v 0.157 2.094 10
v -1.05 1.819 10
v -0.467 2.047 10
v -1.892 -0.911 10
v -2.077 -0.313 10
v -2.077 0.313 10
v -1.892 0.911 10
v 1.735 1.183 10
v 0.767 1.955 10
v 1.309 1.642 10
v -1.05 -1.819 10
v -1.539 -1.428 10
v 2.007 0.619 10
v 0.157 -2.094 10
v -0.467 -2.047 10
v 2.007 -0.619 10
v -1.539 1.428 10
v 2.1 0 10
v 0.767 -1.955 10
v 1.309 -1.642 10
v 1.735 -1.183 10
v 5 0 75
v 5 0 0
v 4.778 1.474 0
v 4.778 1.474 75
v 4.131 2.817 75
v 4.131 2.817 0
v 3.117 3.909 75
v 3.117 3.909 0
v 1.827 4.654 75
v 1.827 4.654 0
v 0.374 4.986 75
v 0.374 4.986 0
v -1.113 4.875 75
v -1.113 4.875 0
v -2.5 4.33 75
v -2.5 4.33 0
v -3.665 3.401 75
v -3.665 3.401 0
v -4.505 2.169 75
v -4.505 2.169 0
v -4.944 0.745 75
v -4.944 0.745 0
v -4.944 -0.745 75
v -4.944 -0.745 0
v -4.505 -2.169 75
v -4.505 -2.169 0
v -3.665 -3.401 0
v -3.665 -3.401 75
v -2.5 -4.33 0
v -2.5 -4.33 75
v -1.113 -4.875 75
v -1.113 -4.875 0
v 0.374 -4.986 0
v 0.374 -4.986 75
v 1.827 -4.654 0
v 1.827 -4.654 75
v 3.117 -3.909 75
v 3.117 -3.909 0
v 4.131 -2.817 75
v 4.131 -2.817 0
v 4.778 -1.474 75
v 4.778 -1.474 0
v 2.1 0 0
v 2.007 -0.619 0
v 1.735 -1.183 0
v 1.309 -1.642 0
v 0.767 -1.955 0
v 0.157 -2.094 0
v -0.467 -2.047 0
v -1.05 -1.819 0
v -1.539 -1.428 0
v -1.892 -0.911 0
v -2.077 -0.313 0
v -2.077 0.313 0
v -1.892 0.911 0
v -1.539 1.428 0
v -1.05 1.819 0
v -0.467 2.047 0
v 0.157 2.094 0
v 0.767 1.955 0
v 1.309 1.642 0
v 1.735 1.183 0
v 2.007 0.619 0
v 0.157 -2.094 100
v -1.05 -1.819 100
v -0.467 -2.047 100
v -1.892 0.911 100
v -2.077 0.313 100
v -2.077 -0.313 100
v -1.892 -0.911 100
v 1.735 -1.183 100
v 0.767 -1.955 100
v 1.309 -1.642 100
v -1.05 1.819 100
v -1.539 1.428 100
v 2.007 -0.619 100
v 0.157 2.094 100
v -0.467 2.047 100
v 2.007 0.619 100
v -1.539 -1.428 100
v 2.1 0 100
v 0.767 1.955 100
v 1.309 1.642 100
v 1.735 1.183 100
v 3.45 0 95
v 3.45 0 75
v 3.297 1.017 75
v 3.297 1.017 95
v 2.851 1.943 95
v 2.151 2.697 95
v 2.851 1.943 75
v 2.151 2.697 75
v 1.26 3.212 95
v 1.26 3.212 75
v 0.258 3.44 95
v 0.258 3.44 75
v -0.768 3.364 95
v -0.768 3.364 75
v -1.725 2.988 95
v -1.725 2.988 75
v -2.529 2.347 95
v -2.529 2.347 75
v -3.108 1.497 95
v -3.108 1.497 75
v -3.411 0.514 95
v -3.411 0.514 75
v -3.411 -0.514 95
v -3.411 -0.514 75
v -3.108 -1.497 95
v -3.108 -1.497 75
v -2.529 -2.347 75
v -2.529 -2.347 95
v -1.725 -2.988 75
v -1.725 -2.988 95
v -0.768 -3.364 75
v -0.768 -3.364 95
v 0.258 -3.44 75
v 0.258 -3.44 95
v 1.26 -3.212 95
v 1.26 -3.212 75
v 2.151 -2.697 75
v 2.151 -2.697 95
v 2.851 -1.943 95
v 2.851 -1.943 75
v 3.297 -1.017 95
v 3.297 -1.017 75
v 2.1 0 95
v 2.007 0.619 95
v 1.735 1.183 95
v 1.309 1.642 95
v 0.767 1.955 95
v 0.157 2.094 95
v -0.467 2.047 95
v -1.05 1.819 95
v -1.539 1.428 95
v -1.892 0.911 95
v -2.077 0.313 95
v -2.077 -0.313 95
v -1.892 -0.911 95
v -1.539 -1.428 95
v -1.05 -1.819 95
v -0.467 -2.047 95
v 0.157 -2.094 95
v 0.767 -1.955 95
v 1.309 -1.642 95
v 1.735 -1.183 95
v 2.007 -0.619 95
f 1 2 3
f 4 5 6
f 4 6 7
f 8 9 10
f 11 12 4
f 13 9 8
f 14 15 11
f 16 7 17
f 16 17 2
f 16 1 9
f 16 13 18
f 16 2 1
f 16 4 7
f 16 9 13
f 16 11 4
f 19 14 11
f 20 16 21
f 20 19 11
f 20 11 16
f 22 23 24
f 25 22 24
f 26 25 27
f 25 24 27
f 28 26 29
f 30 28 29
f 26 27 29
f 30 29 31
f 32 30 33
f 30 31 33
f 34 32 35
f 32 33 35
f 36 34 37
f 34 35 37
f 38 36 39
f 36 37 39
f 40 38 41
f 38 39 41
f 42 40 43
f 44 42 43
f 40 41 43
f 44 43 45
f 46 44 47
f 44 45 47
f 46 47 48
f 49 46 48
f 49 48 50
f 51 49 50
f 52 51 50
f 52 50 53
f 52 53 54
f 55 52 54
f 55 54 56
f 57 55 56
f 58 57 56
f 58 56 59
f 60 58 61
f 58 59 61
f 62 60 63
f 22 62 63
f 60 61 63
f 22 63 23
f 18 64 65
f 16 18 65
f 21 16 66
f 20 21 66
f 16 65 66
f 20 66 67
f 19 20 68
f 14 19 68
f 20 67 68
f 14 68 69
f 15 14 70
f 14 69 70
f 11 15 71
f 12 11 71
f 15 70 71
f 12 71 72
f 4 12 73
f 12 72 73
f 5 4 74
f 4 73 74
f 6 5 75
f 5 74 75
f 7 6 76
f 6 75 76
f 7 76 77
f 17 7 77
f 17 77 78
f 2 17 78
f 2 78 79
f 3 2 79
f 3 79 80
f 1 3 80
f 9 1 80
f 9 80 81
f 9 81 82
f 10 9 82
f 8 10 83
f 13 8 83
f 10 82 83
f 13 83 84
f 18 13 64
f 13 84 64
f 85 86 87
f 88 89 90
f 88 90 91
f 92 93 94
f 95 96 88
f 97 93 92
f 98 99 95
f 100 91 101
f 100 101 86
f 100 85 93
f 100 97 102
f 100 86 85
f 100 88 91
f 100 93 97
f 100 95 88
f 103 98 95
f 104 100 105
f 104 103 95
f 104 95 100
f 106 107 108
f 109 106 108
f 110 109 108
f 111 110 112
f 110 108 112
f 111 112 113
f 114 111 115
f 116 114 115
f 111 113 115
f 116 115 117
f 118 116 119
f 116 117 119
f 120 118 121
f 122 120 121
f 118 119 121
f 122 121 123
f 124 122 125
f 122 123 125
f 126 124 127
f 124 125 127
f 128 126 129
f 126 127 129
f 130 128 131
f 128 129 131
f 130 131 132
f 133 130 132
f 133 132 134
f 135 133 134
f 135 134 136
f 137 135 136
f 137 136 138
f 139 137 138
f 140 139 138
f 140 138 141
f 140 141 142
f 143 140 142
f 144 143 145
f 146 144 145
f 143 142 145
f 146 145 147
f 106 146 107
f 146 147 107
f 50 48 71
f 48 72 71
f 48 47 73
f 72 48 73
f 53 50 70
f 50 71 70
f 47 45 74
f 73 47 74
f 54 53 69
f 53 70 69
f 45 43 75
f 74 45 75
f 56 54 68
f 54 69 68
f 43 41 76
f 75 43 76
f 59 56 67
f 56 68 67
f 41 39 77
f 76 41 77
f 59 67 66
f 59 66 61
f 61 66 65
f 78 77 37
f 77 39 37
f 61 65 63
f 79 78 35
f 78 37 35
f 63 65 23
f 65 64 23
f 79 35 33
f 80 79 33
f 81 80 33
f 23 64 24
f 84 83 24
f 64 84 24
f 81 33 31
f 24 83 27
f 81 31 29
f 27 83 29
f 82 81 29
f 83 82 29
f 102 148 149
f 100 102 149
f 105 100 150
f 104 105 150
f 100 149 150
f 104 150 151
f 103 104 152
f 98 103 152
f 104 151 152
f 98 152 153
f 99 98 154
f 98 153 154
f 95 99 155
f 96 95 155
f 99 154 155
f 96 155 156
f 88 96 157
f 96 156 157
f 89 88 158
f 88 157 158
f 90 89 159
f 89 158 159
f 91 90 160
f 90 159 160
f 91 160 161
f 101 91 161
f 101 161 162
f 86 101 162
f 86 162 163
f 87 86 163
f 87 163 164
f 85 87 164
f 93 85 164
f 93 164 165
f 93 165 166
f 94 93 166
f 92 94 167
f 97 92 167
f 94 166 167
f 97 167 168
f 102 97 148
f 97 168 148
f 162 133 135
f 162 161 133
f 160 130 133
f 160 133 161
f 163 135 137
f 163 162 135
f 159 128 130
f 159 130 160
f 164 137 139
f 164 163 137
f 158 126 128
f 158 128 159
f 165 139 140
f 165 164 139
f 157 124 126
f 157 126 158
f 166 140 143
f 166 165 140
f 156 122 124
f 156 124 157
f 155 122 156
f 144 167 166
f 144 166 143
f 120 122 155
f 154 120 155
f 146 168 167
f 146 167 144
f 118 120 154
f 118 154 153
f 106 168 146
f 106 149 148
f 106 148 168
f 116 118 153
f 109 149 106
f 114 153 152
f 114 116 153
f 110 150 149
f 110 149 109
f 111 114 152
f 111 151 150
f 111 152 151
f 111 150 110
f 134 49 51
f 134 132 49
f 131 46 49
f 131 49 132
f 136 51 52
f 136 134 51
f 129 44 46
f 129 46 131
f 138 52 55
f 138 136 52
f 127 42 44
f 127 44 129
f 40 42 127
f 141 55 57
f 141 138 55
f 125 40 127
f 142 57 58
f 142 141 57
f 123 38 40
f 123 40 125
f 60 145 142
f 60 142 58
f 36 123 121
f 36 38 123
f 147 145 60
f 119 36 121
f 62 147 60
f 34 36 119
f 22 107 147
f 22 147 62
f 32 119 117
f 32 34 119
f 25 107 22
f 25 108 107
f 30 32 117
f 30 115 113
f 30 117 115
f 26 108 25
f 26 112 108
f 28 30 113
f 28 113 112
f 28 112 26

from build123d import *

# Parameters (mm, degrees)
F0_R     = 5
F1_DEPTH = 75
F2_R     = 3.45
F3_DEPTH = 20
F4_R     = 2.1
F5_DEPTH = 5
F6_R     = 2.1
F7_DEPTH = 10


with BuildPart() as f1:
    # F0 (on Top) → F1 (new body)
    with BuildSketch(Plane.XY):
        Circle(F0_R)
    extrude(amount=F1_DEPTH)

    # F2 (on face) → F3 (join)
    with BuildSketch(Plane.XY.offset(75)):
        Circle(F2_R)
    extrude(amount=F3_DEPTH)

    # F4 (on face) → F5 (join)
    with BuildSketch(Plane.XY.offset(95)):
        Circle(F4_R)
    extrude(amount=F5_DEPTH)

    # F6 (on face) → F7 (cut)
    with BuildSketch(Plane(origin=(0, 0, 0), x_dir=(1, 0, 0), z_dir=(0, 0, -1))):
        Circle(F6_R)
    extrude(amount=-F7_DEPTH, mode=Mode.SUBTRACT)


solid = f1.part
